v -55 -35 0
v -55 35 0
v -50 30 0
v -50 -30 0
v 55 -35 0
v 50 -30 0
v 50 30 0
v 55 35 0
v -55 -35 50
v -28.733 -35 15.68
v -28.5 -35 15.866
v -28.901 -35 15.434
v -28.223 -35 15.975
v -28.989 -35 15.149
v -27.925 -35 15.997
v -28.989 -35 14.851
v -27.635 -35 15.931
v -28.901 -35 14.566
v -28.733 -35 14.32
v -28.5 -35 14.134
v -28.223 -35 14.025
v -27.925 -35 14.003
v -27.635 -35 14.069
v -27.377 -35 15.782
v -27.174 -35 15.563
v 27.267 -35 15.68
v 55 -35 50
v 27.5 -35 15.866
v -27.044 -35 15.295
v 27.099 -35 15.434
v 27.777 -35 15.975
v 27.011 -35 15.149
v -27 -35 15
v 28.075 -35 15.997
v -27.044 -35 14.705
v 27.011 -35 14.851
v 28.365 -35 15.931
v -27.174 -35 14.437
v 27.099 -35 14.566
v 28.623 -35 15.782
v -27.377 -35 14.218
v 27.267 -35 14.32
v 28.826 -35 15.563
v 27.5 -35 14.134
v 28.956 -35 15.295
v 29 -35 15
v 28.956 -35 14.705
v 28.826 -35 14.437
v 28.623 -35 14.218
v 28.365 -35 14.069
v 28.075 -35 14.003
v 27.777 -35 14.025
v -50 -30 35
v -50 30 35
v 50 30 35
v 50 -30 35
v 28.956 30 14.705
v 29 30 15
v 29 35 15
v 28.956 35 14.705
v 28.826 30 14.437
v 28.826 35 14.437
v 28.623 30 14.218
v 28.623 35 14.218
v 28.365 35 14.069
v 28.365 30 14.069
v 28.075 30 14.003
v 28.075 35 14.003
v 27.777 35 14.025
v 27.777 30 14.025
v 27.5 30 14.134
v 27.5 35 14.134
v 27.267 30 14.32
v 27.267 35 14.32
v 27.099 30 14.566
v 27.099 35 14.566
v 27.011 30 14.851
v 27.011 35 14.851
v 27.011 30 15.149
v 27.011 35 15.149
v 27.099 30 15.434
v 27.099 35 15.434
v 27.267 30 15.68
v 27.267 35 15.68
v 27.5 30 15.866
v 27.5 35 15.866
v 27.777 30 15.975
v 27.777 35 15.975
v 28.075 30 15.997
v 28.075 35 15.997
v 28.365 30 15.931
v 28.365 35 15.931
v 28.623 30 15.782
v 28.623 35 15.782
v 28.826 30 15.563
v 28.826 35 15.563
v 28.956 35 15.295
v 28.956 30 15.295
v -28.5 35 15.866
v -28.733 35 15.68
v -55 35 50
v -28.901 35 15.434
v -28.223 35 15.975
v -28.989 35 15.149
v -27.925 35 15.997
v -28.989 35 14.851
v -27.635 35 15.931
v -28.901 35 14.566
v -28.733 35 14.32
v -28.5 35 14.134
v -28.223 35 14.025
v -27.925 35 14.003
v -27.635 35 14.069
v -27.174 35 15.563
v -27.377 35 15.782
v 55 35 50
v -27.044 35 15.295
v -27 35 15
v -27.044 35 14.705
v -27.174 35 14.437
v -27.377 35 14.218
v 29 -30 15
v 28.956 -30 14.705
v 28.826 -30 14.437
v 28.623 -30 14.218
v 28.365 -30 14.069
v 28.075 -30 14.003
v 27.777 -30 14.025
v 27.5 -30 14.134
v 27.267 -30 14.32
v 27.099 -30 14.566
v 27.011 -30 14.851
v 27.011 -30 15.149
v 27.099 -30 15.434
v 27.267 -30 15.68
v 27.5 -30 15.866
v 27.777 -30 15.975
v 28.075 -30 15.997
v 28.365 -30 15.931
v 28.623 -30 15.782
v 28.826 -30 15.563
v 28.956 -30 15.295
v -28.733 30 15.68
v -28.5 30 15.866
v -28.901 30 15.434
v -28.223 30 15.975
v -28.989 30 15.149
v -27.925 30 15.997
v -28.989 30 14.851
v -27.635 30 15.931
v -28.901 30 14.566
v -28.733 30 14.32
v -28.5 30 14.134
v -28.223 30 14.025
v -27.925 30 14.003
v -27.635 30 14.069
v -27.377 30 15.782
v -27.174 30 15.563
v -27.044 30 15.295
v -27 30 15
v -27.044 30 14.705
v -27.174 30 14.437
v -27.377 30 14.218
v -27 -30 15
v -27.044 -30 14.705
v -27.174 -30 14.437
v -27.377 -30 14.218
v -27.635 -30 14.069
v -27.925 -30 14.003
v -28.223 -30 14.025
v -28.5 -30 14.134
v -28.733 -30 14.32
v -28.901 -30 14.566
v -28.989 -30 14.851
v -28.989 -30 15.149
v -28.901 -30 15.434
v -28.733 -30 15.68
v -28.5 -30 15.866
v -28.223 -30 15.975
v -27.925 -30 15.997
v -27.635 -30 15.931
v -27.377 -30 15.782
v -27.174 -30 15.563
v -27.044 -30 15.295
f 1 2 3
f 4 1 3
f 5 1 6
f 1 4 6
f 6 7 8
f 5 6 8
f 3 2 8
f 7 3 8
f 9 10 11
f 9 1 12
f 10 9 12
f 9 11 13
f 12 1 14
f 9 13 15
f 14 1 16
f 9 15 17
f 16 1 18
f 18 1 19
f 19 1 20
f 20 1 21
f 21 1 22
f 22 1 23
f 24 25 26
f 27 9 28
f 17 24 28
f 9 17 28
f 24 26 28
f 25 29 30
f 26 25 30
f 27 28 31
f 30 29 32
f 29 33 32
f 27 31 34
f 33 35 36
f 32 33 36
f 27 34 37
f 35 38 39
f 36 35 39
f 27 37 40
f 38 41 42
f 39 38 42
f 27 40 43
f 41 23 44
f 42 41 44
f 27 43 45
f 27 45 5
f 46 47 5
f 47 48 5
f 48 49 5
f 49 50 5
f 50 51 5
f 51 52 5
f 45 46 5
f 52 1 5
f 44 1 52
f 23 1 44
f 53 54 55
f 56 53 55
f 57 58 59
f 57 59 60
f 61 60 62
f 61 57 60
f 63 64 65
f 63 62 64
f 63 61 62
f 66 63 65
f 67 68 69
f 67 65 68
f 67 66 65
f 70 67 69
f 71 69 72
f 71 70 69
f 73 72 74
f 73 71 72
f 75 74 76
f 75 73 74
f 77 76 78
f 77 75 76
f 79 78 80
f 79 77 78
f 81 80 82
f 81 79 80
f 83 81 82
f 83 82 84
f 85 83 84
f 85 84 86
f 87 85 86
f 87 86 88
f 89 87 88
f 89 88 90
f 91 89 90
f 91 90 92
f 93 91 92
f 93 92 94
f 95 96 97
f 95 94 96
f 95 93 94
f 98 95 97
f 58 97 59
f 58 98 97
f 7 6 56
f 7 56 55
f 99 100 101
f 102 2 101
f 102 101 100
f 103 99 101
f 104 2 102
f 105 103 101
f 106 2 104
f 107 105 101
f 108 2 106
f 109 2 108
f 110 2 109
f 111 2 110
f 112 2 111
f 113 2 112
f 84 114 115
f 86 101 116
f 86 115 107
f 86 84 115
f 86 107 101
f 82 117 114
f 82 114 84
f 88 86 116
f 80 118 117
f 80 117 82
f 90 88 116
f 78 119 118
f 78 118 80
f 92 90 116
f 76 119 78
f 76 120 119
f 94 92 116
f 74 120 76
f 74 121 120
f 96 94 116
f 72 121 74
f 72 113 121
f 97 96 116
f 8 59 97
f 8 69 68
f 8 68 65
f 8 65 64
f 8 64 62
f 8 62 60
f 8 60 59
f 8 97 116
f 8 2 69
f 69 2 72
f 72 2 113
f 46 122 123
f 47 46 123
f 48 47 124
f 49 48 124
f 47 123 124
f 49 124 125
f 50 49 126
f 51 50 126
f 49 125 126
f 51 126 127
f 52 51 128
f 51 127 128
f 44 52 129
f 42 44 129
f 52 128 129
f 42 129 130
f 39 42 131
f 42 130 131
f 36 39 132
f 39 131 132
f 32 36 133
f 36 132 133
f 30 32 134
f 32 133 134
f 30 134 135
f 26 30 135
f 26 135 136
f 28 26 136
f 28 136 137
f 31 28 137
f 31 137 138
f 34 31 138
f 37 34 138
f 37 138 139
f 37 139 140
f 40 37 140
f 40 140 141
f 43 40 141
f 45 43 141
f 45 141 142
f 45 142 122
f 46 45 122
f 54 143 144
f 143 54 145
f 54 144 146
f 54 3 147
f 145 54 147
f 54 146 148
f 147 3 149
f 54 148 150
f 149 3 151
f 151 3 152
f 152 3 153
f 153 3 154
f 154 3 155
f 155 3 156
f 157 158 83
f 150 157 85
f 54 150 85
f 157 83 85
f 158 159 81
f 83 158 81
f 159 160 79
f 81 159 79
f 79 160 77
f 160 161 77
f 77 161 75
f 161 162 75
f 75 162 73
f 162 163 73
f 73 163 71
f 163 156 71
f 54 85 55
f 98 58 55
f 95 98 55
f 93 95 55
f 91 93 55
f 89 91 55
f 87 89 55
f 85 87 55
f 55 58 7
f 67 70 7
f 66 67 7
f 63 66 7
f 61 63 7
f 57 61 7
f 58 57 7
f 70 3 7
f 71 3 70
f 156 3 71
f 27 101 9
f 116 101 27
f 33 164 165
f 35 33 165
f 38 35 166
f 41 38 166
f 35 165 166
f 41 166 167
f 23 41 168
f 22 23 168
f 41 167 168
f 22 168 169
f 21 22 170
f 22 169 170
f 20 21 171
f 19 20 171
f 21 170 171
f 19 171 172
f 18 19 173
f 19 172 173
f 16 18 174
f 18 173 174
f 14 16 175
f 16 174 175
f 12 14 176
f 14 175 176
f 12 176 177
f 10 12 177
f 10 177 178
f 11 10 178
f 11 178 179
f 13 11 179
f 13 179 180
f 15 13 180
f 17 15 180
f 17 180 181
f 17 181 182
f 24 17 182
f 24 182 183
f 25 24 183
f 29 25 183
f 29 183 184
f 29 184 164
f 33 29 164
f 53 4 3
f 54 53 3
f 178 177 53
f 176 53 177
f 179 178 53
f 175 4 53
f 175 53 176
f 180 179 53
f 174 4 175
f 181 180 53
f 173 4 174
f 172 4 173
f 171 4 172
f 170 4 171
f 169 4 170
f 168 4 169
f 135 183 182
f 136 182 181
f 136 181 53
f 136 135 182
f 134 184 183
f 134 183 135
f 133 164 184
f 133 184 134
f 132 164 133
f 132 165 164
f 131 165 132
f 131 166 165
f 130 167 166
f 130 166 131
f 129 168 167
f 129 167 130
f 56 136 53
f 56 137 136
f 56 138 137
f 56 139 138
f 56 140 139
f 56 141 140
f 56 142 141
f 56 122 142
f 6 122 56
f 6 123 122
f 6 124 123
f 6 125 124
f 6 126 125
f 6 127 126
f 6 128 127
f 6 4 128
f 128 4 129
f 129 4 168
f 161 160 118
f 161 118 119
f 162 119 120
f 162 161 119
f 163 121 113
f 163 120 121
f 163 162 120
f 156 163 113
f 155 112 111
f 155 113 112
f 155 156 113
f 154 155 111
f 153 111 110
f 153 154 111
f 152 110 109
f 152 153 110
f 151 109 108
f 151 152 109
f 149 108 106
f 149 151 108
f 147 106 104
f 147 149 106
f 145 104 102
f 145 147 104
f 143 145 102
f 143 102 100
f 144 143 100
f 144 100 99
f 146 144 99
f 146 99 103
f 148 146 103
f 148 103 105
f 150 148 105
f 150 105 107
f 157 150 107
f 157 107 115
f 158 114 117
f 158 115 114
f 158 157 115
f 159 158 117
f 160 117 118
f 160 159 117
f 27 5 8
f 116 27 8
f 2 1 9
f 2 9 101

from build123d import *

# Parameters (mm, degrees)
SKETCH_1_W               = 110
SKETCH_1_H               = 70
EXTRUDE_1_DEPTH          = 50
SKETCH_3_W               = 100
SKETCH_3_H               = 60
CUT_EXTRUDE_1_DEPTH      = 35
SKETCH_4_R               = 1
CUT_EXTRUDE_2_DEPTH      = 40
CUT_EXTRUDE_2_DEPTH_BACK = 40


with BuildPart() as part:
    # 草圖1 → 填料-伸長1 (new body)
    with BuildSketch(Plane.XY):
        Rectangle(SKETCH_1_W, SKETCH_1_H)
    extrude(amount=EXTRUDE_1_DEPTH)

    # 草圖3 → 除料-伸長1 (cut)
    with BuildSketch(Plane.XY):
        Rectangle(SKETCH_3_W, SKETCH_3_H)
    extrude(amount=CUT_EXTRUDE_1_DEPTH, mode=Mode.SUBTRACT)

    # 草圖4 → 除料-伸長2 (cut, two sides)
    with BuildSketch(Plane(origin=(0, 0, 0), x_dir=(1, 0, 0), z_dir=(0, 1, 0))) as cut_extrude_2_sk:
        with Locations((28, -15)):
            Circle(SKETCH_4_R)
        with Locations((-28, -15)):
            Circle(SKETCH_4_R)
    extrude(amount=CUT_EXTRUDE_2_DEPTH, mode=Mode.SUBTRACT)
    extrude(cut_extrude_2_sk.sketch, amount=-CUT_EXTRUDE_2_DEPTH_BACK, mode=Mode.SUBTRACT)


solid = part.part
